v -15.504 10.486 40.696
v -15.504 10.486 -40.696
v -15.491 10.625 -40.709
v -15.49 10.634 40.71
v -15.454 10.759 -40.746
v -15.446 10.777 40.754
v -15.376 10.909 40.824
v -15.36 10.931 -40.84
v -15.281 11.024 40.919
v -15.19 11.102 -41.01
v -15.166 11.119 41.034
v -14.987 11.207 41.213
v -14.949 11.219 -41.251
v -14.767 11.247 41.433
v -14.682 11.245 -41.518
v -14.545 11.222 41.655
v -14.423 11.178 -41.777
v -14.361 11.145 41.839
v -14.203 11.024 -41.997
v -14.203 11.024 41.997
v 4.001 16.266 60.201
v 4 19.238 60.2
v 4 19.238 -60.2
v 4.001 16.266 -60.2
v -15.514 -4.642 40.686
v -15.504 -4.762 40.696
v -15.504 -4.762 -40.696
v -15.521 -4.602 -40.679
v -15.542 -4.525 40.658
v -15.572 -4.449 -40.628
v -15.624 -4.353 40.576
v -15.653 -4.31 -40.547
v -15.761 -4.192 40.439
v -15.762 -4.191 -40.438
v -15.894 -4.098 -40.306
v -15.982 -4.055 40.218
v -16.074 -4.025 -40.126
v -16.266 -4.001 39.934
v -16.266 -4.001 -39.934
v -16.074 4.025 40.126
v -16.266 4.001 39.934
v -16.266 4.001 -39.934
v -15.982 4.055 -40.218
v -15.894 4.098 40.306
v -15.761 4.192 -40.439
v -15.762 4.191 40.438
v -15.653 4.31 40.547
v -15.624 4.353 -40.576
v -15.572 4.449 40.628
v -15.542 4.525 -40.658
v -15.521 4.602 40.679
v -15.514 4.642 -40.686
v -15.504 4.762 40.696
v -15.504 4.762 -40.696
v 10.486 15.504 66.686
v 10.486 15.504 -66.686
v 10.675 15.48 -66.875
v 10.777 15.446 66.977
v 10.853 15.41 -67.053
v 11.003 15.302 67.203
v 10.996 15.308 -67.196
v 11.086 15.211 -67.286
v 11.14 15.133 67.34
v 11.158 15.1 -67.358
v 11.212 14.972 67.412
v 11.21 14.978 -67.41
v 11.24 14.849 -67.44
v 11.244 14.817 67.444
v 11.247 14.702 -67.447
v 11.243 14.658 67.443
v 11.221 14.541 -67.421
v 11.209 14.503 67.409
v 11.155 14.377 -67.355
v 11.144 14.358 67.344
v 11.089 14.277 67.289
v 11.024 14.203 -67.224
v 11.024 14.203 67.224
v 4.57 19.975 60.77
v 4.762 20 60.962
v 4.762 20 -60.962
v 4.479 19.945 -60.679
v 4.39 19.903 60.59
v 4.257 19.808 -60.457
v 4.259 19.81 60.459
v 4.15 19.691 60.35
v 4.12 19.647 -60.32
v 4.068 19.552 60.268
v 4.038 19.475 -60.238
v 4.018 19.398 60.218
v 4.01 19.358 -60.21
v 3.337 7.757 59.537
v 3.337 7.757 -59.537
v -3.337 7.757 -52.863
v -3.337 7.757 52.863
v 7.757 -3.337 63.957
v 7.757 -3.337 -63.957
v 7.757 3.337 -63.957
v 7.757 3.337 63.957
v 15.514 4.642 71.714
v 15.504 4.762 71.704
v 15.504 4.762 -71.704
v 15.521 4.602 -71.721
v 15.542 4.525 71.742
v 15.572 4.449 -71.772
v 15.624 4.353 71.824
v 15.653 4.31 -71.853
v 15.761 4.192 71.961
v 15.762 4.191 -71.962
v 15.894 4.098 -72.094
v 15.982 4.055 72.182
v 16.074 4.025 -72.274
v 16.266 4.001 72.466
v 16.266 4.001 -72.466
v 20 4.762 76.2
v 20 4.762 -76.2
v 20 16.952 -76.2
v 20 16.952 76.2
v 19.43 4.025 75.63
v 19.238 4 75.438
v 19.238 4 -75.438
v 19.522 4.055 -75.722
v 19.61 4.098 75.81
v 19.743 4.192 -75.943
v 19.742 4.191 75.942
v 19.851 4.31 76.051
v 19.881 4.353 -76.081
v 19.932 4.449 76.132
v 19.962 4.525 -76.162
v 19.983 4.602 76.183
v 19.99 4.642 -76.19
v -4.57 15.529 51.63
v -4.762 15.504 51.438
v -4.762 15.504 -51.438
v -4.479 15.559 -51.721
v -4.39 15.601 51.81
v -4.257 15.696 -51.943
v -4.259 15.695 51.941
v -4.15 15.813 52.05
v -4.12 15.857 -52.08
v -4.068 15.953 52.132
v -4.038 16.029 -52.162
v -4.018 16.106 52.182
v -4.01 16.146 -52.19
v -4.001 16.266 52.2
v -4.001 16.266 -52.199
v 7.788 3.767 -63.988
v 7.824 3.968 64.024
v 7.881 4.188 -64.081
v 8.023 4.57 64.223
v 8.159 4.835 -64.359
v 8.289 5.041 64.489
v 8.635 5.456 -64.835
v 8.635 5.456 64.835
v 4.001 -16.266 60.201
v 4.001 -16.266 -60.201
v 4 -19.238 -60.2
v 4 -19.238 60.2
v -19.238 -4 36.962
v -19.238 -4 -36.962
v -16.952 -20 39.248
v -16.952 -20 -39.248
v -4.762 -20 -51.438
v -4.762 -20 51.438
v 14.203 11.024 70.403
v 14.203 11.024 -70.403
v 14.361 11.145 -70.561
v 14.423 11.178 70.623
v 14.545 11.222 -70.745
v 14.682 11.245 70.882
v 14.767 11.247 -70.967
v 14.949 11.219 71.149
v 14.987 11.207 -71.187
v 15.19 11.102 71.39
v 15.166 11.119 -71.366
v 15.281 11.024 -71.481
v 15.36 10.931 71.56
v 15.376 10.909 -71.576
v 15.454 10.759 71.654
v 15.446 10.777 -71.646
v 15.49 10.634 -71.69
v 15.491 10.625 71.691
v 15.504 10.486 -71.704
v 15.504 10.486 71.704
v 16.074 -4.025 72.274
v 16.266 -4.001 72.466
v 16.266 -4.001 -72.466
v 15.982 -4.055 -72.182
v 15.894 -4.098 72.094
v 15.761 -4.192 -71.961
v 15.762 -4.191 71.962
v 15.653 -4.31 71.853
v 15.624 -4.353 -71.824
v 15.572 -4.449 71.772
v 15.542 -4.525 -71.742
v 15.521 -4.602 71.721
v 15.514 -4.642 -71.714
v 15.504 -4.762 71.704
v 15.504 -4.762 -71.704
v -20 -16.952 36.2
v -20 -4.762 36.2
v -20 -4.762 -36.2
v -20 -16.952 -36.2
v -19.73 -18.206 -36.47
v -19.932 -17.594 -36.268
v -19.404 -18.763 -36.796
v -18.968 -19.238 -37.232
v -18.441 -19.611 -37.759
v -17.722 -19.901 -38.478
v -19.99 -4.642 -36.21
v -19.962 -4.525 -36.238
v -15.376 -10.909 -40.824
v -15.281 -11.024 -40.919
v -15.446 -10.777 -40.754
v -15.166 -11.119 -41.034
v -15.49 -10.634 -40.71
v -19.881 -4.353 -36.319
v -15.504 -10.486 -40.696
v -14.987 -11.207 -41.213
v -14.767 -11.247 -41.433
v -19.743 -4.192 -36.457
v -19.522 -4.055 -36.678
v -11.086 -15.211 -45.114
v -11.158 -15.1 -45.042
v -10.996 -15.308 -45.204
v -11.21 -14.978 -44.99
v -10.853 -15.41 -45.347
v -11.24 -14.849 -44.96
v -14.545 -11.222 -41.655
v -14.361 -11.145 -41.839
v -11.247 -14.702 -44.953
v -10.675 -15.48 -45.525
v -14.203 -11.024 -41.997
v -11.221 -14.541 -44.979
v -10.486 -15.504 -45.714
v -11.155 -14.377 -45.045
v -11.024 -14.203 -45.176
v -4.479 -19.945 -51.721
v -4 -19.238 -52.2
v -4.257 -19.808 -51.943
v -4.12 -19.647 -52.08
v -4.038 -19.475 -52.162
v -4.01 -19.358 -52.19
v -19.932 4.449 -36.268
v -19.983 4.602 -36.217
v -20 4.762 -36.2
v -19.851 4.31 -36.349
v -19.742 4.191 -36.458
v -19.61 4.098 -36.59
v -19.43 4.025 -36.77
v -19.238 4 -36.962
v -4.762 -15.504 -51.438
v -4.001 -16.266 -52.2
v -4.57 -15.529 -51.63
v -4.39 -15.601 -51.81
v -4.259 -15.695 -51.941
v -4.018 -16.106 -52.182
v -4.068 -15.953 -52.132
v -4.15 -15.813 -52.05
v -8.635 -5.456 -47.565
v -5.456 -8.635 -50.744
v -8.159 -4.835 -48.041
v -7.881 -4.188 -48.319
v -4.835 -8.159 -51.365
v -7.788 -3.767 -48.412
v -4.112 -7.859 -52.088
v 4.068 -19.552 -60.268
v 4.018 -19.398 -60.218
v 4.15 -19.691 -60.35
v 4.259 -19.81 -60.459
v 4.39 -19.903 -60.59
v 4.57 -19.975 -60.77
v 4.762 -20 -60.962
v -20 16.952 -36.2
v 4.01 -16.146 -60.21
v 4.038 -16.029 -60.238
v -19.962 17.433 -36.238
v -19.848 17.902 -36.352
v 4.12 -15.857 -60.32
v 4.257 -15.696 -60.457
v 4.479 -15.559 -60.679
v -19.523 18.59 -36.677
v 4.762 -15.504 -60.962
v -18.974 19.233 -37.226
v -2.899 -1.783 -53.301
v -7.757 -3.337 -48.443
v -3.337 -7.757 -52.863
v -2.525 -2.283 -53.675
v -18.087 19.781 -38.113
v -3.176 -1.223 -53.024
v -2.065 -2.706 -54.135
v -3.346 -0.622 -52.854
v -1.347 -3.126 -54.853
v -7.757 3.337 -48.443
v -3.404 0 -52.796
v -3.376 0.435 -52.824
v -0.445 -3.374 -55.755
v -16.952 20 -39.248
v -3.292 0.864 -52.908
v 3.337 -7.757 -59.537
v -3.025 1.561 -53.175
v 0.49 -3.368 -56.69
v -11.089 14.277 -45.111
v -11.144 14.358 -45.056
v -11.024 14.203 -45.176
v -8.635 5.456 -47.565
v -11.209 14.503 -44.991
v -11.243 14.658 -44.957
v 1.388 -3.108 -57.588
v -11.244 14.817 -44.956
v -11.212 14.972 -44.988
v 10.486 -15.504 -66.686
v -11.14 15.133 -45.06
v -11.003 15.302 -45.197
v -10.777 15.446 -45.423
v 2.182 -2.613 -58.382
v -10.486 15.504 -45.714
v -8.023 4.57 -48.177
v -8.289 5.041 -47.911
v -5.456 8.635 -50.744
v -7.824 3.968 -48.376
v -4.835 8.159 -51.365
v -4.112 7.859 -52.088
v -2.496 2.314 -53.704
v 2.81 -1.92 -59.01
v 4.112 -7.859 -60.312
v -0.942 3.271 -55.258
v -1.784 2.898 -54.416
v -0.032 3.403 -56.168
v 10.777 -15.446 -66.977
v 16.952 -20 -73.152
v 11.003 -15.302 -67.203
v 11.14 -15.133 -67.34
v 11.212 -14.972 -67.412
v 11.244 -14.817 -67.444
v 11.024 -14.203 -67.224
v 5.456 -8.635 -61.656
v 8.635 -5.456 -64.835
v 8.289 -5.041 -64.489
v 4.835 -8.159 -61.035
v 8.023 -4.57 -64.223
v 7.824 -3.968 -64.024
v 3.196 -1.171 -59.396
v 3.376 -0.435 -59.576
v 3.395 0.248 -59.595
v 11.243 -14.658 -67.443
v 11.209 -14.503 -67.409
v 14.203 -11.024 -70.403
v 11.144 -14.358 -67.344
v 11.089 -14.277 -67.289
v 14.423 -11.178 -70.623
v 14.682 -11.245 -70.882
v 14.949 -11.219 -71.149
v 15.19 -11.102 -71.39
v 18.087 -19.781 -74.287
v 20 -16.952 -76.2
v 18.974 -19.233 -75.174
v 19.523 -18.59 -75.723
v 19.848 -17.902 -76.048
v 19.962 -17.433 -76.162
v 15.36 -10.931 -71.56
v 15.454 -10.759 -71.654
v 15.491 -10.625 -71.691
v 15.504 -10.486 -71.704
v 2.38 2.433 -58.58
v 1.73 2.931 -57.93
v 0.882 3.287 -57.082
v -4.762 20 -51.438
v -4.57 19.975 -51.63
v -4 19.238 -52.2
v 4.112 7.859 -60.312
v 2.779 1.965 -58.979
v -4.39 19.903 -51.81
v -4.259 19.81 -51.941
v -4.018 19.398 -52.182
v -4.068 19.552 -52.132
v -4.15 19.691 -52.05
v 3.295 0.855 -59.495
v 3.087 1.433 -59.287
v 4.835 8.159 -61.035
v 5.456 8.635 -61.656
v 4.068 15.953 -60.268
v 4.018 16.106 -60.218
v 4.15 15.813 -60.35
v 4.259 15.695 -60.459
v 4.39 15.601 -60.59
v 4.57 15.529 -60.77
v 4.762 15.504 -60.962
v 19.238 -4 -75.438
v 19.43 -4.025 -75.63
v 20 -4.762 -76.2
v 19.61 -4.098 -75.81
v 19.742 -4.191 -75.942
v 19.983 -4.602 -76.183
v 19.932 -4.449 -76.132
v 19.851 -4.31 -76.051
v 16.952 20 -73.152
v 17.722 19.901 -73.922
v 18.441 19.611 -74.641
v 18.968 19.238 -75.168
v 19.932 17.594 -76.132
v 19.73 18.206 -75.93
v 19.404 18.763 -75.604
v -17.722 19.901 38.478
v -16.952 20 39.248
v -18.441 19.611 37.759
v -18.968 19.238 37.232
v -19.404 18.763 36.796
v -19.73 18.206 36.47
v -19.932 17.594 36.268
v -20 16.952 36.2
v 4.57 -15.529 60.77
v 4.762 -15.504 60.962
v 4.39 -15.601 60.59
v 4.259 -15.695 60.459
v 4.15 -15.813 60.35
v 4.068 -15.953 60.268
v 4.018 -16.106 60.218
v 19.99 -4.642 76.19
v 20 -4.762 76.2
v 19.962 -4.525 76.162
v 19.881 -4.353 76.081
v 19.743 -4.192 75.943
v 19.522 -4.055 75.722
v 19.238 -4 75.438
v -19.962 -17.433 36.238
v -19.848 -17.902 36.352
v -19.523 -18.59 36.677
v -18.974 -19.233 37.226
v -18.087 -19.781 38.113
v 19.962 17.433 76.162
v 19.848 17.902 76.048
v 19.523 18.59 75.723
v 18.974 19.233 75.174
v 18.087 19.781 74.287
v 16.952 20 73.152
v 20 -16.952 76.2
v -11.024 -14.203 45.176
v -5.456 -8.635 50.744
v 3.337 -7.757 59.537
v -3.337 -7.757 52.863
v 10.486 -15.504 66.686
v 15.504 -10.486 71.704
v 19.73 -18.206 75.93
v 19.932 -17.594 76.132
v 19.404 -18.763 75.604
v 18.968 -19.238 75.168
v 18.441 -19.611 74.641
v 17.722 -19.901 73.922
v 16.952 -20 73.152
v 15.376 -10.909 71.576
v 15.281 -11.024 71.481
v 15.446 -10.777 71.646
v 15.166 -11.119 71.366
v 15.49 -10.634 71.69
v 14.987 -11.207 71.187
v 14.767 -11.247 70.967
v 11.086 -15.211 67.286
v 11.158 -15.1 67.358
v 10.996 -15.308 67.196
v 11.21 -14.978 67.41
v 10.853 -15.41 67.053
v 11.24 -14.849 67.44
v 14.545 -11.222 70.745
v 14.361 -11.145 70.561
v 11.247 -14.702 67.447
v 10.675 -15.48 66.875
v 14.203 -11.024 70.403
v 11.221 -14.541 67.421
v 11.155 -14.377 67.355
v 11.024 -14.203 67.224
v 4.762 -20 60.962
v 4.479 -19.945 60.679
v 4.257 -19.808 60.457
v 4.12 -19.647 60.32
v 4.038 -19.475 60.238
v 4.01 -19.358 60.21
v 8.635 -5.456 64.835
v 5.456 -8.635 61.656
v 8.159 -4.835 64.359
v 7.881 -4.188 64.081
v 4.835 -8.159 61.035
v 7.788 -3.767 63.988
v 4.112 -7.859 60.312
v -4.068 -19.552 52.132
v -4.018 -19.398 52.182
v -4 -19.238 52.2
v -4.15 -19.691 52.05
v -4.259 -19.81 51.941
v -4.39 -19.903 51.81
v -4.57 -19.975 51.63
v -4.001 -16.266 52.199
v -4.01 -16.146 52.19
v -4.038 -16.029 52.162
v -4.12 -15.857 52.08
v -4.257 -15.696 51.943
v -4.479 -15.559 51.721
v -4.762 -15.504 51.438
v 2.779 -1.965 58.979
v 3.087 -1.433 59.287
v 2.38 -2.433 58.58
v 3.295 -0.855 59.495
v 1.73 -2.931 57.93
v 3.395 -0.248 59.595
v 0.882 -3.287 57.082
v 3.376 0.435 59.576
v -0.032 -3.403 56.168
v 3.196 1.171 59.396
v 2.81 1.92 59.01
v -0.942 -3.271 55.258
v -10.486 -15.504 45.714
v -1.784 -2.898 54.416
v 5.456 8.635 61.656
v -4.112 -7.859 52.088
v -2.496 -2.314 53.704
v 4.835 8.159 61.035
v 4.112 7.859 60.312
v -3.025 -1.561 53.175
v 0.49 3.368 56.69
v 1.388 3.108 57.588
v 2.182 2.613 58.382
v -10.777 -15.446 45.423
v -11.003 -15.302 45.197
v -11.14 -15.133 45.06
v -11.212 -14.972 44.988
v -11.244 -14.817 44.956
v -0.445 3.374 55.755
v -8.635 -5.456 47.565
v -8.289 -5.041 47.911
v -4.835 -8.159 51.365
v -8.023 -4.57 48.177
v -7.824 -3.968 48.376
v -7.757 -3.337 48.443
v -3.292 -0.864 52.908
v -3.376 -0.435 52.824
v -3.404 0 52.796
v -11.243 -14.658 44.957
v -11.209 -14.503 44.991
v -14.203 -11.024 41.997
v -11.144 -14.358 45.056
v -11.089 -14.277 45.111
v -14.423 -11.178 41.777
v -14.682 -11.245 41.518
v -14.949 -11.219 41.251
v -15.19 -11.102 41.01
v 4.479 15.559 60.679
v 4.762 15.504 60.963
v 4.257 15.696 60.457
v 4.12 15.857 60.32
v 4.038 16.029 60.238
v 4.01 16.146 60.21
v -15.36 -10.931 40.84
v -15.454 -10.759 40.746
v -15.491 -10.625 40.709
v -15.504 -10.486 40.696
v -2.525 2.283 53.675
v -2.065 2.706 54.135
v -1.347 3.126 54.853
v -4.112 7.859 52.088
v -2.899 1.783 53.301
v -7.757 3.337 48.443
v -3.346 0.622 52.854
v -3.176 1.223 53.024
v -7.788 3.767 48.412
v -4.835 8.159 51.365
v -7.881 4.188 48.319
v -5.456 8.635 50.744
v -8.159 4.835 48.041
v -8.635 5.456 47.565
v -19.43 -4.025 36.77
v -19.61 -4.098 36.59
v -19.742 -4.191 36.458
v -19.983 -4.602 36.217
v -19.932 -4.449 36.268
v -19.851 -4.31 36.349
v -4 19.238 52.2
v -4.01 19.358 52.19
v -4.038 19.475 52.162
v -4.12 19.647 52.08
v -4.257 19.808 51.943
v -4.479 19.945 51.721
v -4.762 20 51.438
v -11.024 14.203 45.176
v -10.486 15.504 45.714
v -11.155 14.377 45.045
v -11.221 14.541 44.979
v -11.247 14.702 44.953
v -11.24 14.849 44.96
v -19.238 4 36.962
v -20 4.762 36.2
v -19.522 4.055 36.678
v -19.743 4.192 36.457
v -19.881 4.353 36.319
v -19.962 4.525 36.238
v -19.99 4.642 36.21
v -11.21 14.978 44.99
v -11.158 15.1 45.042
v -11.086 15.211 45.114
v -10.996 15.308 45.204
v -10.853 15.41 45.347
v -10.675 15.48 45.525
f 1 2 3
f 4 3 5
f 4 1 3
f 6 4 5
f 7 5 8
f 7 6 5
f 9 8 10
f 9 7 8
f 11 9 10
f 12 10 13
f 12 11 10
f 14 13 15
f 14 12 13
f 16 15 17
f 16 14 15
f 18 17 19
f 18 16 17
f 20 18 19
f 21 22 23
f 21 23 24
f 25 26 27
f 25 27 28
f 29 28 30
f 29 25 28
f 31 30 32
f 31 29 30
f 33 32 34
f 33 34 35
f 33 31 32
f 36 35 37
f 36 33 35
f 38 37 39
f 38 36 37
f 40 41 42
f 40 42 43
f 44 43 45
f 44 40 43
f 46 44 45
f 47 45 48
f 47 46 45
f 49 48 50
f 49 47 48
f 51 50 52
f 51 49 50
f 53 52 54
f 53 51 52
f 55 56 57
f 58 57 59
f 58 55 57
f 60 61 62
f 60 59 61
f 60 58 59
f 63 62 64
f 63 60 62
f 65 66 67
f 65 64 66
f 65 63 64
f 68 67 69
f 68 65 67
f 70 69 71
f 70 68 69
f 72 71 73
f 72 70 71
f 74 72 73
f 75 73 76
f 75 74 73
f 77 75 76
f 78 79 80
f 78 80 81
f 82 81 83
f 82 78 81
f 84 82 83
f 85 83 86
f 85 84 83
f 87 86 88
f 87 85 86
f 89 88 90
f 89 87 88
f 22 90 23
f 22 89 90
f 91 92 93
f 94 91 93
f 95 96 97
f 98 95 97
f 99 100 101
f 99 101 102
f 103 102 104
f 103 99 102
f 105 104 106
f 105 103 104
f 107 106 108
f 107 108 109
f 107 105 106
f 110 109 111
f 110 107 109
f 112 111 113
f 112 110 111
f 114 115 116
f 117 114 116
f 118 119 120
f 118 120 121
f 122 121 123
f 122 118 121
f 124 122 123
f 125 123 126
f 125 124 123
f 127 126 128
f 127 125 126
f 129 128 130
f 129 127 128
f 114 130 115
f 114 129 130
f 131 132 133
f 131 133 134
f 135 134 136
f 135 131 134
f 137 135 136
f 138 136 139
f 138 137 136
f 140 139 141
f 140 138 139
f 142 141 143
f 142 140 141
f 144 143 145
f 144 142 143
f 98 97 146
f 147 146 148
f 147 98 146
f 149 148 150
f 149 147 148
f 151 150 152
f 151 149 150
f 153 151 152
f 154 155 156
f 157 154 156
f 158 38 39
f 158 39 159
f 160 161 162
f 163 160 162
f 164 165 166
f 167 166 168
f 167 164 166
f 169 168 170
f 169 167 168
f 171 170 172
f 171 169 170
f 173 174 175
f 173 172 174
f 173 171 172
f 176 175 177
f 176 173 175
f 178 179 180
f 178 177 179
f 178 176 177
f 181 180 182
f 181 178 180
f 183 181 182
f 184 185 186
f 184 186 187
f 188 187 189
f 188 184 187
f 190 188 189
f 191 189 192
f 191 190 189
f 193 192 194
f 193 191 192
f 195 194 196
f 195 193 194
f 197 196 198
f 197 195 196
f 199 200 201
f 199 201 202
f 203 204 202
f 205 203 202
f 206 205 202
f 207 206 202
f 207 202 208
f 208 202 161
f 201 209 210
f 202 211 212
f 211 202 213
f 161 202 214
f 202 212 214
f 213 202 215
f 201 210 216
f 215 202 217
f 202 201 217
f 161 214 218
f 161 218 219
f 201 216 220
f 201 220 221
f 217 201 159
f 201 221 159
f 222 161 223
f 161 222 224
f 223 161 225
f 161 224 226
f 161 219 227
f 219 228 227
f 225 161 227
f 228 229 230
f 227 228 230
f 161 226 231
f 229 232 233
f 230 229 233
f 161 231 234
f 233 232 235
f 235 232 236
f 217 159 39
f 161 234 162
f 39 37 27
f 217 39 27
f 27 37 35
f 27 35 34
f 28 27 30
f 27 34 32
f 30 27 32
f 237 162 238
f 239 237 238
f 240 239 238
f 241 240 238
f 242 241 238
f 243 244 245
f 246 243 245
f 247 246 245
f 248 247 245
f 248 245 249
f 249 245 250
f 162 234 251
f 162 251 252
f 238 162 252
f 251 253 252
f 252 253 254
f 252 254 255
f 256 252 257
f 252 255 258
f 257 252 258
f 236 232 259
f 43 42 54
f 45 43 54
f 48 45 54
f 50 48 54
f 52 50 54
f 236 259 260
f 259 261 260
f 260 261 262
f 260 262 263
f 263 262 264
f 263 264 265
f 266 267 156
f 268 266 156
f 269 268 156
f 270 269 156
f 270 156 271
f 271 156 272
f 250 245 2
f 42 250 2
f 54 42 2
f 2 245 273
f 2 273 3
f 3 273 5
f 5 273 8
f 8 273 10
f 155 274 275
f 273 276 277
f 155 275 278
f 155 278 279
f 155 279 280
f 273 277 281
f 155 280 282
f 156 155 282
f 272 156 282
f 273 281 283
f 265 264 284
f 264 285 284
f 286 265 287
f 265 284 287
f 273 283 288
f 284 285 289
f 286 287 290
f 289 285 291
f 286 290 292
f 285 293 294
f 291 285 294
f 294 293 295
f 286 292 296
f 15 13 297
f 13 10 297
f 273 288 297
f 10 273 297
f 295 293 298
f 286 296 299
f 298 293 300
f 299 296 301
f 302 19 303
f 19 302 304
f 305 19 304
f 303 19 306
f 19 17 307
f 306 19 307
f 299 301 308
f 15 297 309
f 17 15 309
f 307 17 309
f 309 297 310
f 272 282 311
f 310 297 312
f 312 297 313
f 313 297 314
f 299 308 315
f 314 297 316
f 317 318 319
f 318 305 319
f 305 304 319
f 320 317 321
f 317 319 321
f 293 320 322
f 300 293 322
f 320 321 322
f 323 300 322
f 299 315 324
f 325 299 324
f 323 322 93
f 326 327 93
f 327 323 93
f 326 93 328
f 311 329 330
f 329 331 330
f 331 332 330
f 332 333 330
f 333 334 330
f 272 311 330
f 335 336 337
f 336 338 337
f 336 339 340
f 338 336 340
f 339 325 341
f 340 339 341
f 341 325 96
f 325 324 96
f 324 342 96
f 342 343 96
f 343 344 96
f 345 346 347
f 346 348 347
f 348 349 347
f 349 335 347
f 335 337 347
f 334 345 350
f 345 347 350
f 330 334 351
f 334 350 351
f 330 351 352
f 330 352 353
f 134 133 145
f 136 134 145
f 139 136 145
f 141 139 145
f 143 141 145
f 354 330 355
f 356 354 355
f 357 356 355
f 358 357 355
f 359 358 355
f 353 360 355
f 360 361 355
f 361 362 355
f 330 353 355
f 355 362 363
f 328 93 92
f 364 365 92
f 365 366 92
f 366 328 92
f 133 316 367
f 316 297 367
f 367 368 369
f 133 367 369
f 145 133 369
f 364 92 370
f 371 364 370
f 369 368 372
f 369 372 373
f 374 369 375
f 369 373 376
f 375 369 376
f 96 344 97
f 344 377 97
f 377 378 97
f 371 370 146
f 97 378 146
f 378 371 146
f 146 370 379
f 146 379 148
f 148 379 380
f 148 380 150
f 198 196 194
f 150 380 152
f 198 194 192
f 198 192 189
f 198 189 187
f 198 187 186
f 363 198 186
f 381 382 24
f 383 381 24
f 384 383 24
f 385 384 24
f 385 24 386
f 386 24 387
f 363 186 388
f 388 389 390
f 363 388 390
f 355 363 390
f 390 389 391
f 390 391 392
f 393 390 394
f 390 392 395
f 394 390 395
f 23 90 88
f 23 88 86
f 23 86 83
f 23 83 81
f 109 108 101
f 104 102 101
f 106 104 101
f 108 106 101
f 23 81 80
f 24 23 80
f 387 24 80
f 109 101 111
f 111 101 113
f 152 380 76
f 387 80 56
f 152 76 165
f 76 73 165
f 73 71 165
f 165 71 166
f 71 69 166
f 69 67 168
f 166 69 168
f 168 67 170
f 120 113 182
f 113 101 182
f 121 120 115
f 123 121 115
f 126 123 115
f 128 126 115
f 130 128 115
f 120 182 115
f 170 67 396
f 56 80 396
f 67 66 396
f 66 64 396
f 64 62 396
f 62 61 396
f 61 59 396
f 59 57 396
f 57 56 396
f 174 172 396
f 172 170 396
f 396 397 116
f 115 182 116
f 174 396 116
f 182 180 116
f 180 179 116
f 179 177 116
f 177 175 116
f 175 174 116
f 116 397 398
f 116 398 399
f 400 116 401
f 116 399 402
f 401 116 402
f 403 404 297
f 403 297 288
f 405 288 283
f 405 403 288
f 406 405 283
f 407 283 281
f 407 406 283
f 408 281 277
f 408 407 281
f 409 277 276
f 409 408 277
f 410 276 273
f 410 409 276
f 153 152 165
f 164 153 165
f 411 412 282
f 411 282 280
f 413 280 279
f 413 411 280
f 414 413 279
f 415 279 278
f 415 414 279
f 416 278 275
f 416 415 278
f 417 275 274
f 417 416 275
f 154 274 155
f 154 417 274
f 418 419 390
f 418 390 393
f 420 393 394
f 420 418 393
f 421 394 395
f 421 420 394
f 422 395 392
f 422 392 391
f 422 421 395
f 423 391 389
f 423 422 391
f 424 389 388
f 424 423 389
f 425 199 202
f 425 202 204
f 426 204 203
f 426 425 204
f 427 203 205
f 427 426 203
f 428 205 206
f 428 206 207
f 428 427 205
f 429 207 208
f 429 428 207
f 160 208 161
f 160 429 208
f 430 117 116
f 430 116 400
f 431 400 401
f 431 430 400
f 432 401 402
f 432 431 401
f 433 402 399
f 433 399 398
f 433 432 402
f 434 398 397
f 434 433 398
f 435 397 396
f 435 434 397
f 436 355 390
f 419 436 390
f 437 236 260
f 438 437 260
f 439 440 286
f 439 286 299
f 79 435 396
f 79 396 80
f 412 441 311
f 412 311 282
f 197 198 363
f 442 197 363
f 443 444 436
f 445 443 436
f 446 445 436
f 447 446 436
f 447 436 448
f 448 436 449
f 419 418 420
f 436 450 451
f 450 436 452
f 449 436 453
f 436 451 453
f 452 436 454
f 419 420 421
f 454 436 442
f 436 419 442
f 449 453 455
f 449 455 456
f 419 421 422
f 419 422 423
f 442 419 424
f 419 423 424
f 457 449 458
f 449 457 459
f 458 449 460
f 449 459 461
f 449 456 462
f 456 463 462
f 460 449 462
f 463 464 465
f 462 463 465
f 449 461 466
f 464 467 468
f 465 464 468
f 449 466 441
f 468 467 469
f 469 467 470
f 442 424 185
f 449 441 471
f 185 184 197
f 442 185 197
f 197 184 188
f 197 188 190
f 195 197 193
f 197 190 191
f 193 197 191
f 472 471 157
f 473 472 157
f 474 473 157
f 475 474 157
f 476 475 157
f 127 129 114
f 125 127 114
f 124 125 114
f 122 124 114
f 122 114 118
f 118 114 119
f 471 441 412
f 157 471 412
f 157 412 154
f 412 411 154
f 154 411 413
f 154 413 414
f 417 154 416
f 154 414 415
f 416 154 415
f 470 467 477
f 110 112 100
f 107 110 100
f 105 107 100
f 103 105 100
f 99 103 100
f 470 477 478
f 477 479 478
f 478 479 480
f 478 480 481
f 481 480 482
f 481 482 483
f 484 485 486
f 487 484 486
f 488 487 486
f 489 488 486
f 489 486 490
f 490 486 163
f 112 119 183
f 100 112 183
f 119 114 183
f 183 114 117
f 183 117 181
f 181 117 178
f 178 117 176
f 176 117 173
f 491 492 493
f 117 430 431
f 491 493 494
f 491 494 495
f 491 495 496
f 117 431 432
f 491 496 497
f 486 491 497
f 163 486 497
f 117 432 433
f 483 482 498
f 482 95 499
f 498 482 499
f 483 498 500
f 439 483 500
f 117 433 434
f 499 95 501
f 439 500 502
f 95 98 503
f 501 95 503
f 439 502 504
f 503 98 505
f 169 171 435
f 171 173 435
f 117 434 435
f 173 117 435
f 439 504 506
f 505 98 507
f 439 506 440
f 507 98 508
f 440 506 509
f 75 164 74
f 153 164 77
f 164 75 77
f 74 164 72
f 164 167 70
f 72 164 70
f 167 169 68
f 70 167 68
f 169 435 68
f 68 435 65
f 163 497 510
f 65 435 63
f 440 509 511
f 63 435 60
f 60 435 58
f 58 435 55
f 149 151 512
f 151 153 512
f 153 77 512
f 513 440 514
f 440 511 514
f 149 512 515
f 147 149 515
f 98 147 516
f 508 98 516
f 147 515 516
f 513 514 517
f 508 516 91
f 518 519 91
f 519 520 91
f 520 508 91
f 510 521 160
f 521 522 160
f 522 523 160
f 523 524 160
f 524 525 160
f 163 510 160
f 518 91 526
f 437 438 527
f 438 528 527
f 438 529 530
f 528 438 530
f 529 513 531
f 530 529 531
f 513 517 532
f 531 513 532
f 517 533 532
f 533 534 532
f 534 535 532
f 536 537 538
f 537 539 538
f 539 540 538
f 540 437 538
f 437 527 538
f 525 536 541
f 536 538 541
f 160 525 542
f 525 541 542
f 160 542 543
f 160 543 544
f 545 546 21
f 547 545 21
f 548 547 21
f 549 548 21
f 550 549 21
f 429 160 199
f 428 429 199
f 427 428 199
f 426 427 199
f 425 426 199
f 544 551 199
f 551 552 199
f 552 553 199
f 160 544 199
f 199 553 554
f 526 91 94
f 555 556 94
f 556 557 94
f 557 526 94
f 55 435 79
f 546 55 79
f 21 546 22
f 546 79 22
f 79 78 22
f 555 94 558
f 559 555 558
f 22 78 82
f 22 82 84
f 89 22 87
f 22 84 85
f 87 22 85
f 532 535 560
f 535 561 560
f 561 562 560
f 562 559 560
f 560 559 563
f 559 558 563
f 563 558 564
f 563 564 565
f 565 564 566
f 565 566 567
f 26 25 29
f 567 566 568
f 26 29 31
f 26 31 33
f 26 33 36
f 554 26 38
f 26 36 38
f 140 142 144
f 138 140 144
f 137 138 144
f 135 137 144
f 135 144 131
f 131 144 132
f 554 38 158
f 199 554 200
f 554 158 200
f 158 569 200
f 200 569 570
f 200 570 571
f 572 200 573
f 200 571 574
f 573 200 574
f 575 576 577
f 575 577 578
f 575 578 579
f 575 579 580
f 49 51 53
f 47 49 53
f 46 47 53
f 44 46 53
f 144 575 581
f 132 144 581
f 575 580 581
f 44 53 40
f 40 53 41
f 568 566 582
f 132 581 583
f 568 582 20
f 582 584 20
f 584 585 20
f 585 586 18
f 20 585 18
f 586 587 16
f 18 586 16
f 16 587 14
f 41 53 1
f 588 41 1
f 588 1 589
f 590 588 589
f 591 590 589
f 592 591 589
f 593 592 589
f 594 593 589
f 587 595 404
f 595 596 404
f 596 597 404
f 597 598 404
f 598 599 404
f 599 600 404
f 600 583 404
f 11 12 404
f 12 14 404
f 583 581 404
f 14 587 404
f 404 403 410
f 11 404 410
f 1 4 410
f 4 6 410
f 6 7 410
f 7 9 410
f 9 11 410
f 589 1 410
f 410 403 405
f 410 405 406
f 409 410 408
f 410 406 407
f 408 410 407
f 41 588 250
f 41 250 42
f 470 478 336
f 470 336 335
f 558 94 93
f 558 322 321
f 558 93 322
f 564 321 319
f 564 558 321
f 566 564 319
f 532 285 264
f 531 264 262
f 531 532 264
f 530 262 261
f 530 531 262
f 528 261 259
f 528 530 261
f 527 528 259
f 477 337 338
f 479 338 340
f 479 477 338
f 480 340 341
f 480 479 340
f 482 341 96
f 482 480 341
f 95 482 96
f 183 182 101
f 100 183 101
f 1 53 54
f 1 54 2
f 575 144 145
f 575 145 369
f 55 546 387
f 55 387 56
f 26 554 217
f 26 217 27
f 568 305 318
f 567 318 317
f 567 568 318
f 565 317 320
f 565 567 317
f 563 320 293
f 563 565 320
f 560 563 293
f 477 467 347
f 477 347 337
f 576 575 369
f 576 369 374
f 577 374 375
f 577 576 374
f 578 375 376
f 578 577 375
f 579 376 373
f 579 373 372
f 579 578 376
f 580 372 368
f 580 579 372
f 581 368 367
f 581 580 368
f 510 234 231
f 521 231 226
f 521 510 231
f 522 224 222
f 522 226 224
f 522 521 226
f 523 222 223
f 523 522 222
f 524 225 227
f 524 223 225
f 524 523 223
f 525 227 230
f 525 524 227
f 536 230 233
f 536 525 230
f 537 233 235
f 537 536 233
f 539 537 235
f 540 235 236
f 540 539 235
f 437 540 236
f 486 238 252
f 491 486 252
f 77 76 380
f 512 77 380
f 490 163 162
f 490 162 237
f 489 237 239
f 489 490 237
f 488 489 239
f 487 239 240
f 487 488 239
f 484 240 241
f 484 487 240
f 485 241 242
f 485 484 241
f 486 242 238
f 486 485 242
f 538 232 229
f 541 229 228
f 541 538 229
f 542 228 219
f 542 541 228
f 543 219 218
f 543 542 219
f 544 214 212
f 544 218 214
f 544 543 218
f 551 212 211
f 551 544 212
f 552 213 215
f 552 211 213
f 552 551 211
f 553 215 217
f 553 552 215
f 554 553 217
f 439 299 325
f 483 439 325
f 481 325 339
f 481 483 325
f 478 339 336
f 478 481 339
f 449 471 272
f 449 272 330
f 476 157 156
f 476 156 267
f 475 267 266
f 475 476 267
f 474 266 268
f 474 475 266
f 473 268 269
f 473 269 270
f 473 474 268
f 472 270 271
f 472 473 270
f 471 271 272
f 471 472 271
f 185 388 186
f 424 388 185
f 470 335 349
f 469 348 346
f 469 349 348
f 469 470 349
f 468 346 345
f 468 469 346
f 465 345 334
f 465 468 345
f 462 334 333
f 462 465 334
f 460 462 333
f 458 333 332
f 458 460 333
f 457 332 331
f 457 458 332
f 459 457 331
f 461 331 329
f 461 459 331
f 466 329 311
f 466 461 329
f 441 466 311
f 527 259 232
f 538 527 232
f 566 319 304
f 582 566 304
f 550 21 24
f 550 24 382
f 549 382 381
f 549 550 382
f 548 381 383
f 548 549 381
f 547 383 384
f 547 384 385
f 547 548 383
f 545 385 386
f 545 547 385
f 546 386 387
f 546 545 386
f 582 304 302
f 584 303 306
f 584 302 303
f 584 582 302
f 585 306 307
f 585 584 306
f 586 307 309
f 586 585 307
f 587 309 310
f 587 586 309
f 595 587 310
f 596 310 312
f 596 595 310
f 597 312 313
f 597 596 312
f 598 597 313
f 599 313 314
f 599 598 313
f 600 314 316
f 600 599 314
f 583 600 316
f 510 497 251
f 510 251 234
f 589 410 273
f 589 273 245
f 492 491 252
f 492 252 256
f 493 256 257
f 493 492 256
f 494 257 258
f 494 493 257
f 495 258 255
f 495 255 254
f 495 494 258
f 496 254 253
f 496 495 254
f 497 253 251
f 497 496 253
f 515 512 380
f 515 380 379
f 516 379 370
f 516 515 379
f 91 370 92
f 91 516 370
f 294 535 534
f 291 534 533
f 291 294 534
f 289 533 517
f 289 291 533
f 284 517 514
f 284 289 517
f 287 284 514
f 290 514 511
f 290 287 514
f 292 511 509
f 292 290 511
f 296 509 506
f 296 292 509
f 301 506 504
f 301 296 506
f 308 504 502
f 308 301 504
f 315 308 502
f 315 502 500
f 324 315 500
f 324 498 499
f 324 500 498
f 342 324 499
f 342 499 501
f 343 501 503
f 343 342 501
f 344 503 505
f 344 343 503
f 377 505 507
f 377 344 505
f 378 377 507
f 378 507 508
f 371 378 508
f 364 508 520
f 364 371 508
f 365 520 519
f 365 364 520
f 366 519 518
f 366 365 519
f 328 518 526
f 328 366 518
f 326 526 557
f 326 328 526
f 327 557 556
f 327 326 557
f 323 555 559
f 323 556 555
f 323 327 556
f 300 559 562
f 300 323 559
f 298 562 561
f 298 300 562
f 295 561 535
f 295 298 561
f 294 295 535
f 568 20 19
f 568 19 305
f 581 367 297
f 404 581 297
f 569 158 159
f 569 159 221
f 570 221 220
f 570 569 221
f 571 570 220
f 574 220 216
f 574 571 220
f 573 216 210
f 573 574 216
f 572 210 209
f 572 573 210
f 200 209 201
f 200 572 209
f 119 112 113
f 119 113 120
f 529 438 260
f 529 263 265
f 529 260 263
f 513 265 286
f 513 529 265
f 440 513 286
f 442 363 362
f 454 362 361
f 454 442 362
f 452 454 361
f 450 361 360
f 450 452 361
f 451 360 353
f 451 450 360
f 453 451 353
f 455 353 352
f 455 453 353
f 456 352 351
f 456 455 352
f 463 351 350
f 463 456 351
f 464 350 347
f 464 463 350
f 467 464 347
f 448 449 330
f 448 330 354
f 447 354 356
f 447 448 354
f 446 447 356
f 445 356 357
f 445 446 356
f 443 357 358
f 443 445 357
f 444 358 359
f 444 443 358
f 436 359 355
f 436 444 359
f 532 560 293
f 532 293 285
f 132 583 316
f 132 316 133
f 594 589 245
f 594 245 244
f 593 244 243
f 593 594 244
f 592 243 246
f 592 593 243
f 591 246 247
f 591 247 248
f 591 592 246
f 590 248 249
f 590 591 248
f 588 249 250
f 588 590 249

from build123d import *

# Parameters (mm, degrees)
SKETCH1_R          = 3.4036
EXTRUDE1_DEPTH     = 76.2
CUT_EXTRUDE1_DEPTH = 88.016609357
CUT_EXTRUDE2_DEPTH = 88.016609357
CUT_EXTRUDE3_REACH = 89.017
CUT_EXTRUDE5_DEPTH = 88.016609357


with BuildPart() as part:
    # Sketch1 → Extrude1 (new, symmetric)
    with BuildSketch(Plane.XY):
        with BuildLine():
            Line((-20, 16.952), (-20, 4.7625))
            ThreePointArc((-20, 4.7625), (-19.776815367, 4.223684633), (-19.238, 4.0005))
            Line((-19.238, 4.0005), (-16.2662, 4.0005))
            ThreePointArc((-16.2662, 4.0005), (-15.727384633, 4.223684633), (-15.5042, 4.7625))
            Line((-15.5042, 4.7625), (-15.5042, 10.485558599))
            ThreePointArc((-15.5042, 10.485558599), (-15.033804775, 11.189554802), (-14.203384633, 11.024373966))
            Line((-14.203384633, 11.024373966), (-8.635059555, 5.456048889))
            ThreePointArc((-8.635059555, 5.456048889), (-7.985348265, 4.483687227), (-7.7572, 3.336708444))
            Line((-7.7572, 3.336708444), (-7.7572, -3.336708444))
            ThreePointArc((-7.7572, -3.336708444), (-7.985348265, -4.483687227), (-8.635059555, -5.456048889))
            Line((-8.635059555, -5.456048889), (-14.203384633, -11.024373966))
            ThreePointArc((-14.203384633, -11.024373966), (-15.033804775, -11.189554802), (-15.5042, -10.485558599))
            Line((-15.5042, -10.485558599), (-15.5042, -4.7625))
            ThreePointArc((-15.5042, -4.7625), (-15.727384633, -4.223684633), (-16.2662, -4.0005))
            Line((-16.2662, -4.0005), (-19.238, -4.0005))
            ThreePointArc((-19.238, -4.0005), (-19.776815367, -4.223684633), (-20, -4.7625))
            Line((-20, -4.7625), (-20, -16.952))
            ThreePointArc((-20, -16.952), (-19.107261469, -19.107261469), (-16.952, -20))
            Line((-16.952, -20), (-4.7625, -20))
            ThreePointArc((-4.7625, -20), (-4.223684633, -19.776815367), (-4.0005, -19.238))
            Line((-4.0005, -19.238), (-4.0005, -16.2662))
            ThreePointArc((-4.0005, -16.2662), (-4.223684633, -15.727384633), (-4.7625, -15.5042))
            Line((-4.7625, -15.5042), (-10.485558599, -15.5042))
            ThreePointArc((-10.485558599, -15.5042), (-11.189554802, -15.033804775), (-11.024373966, -14.203384633))
            Line((-11.024373966, -14.203384633), (-5.456048889, -8.635059555))
            ThreePointArc((-5.456048889, -8.635059555), (-4.483687227, -7.985348265), (-3.336708444, -7.7572))
            Line((-3.336708444, -7.7572), (3.336708444, -7.7572))
            ThreePointArc((3.336708444, -7.7572), (4.483687227, -7.985348265), (5.456048889, -8.635059555))
            Line((5.456048889, -8.635059555), (11.024373966, -14.203384633))
            ThreePointArc((11.024373966, -14.203384633), (11.189554802, -15.033804775), (10.485558599, -15.5042))
            Line((10.485558599, -15.5042), (4.7625, -15.5042))
            ThreePointArc((4.7625, -15.5042), (4.223684633, -15.727384633), (4.0005, -16.2662))
            Line((4.0005, -16.2662), (4.0005, -19.238))
            ThreePointArc((4.0005, -19.238), (4.223684633, -19.776815367), (4.7625, -20))
            Line((4.7625, -20), (16.952, -20))
            ThreePointArc((16.952, -20), (19.107261469, -19.107261469), (20, -16.952))
            Line((20, -16.952), (20, -4.7625))
            ThreePointArc((20, -4.7625), (19.776815367, -4.223684633), (19.238, -4.0005))
            Line((19.238, -4.0005), (16.2662, -4.0005))
            ThreePointArc((16.2662, -4.0005), (15.727384633, -4.223684633), (15.5042, -4.7625))
            Line((15.5042, -4.7625), (15.5042, -10.485558599))
            ThreePointArc((15.5042, -10.485558599), (15.033804775, -11.189554802), (14.203384633, -11.024373966))
            Line((14.203384633, -11.024373966), (8.635059555, -5.456048889))
            ThreePointArc((8.635059555, -5.456048889), (7.985348265, -4.483687227), (7.7572, -3.336708444))
            Line((7.7572, -3.336708444), (7.7572, 3.336708444))
            ThreePointArc((7.7572, 3.336708444), (7.985348265, 4.483687227), (8.635059555, 5.456048889))
            Line((8.635059555, 5.456048889), (14.203384633, 11.024373966))
            ThreePointArc((14.203384633, 11.024373966), (15.033804775, 11.189554802), (15.5042, 10.485558599))
            Line((15.5042, 10.485558599), (15.5042, 4.7625))
            ThreePointArc((15.5042, 4.7625), (15.727384633, 4.223684633), (16.2662, 4.0005))
            Line((16.2662, 4.0005), (19.238, 4.0005))
            ThreePointArc((19.238, 4.0005), (19.776815367, 4.223684633), (20, 4.7625))
            Line((20, 4.7625), (20, 16.952))
            ThreePointArc((20, 16.952), (19.107261469, 19.107261469), (16.952, 20))
            Line((16.952, 20), (4.7625, 20))
            ThreePointArc((4.7625, 20), (4.223684633, 19.776815367), (4.0005, 19.238))
            Line((4.0005, 19.238), (4.0005, 16.2662))
            ThreePointArc((4.0005, 16.2662), (4.223684633, 15.727384633), (4.7625, 15.5042))
            Line((4.7625, 15.5042), (10.485558599, 15.5042))
            ThreePointArc((10.485558599, 15.5042), (11.189554802, 15.033804775), (11.024373966, 14.203384633))
            Line((11.024373966, 14.203384633), (5.456048889, 8.635059555))
            ThreePointArc((5.456048889, 8.635059555), (4.483687227, 7.985348265), (3.336708444, 7.7572))
            Line((3.336708444, 7.7572), (-3.336708444, 7.7572))
            ThreePointArc((-3.336708444, 7.7572), (-4.483687227, 7.985348265), (-5.456048889, 8.635059555))
            Line((-5.456048889, 8.635059555), (-11.024373966, 14.203384633))
            ThreePointArc((-11.024373966, 14.203384633), (-11.189554802, 15.033804775), (-10.485558599, 15.5042))
            Line((-10.485558599, 15.5042), (-4.7625, 15.5042))
            ThreePointArc((-4.7625, 15.5042), (-4.223684633, 15.727384633), (-4.0005, 16.2662))
            Line((-4.0005, 16.2662), (-4.0005, 19.238))
            ThreePointArc((-4.0005, 19.238), (-4.223684633, 19.776815367), (-4.7625, 20))
            Line((-4.7625, 20), (-16.952, 20))
            ThreePointArc((-16.952, 20), (-19.107261469, 19.107261469), (-20, 16.952))
        make_face()
        with Locations(Location((0, 0, 0), (0, 0, 180))):
            Circle(SKETCH1_R, mode=Mode.SUBTRACT)
    extrude(amount=EXTRUDE1_DEPTH, both=True)

    # Sketch3 → Cut-Extrude1 (cut, through all)
    with BuildSketch(Plane(origin=(0, 16.952, 0), x_dir=(1, 0, 0), z_dir=(0, 1, 0))):
        Polygon((20, -76.2), (-20, -36.2), (-20, -76.2), align=None)
    extrude(amount=-CUT_EXTRUDE1_DEPTH, mode=Mode.SUBTRACT)

    # Sketch4 → Cut-Extrude2 (cut, through all)
    with BuildSketch(Plane(origin=(0, 16.952, 0), x_dir=(-1, 0, 0), z_dir=(0, -1, 0))):
        Polygon((20, -36.2), (-20, -76.2), (20, -76.2), align=None)
    extrude(amount=-CUT_EXTRUDE2_DEPTH, mode=Mode.SUBTRACT)

    # Sketch5 → Cut-Extrude3 (cut, up to next)
    with BuildSketch(Plane(origin=(0, 16.952, 0), x_dir=(1, 0, 0), z_dir=(0, 1, 0)), mode=Mode.PRIVATE) as cut_extrude3_sk1:
        Polygon((20, 76.2), (-20, 76.2), (-20, 36.2), align=None)
    cut_extrude3_tool1 = extrude(cut_extrude3_sk1.sketch, amount=-CUT_EXTRUDE3_REACH, mode=Mode.PRIVATE) & part.part
    add(cut_extrude3_tool1.solids().sort_by_distance((-6.666667, 16.952, -62.866667))[0], mode=Mode.SUBTRACT)

    # Sketch7 → Cut-Extrude5 (cut, through all)
    with BuildSketch(Plane(origin=(0, 16.952, 0), x_dir=(-1, 0, 0), z_dir=(0, -1, 0))):
        Polygon((20, 36.2), (20, 76.2), (-20, 76.2), align=None)
    extrude(amount=-CUT_EXTRUDE5_DEPTH, mode=Mode.SUBTRACT)


solid = part.part
